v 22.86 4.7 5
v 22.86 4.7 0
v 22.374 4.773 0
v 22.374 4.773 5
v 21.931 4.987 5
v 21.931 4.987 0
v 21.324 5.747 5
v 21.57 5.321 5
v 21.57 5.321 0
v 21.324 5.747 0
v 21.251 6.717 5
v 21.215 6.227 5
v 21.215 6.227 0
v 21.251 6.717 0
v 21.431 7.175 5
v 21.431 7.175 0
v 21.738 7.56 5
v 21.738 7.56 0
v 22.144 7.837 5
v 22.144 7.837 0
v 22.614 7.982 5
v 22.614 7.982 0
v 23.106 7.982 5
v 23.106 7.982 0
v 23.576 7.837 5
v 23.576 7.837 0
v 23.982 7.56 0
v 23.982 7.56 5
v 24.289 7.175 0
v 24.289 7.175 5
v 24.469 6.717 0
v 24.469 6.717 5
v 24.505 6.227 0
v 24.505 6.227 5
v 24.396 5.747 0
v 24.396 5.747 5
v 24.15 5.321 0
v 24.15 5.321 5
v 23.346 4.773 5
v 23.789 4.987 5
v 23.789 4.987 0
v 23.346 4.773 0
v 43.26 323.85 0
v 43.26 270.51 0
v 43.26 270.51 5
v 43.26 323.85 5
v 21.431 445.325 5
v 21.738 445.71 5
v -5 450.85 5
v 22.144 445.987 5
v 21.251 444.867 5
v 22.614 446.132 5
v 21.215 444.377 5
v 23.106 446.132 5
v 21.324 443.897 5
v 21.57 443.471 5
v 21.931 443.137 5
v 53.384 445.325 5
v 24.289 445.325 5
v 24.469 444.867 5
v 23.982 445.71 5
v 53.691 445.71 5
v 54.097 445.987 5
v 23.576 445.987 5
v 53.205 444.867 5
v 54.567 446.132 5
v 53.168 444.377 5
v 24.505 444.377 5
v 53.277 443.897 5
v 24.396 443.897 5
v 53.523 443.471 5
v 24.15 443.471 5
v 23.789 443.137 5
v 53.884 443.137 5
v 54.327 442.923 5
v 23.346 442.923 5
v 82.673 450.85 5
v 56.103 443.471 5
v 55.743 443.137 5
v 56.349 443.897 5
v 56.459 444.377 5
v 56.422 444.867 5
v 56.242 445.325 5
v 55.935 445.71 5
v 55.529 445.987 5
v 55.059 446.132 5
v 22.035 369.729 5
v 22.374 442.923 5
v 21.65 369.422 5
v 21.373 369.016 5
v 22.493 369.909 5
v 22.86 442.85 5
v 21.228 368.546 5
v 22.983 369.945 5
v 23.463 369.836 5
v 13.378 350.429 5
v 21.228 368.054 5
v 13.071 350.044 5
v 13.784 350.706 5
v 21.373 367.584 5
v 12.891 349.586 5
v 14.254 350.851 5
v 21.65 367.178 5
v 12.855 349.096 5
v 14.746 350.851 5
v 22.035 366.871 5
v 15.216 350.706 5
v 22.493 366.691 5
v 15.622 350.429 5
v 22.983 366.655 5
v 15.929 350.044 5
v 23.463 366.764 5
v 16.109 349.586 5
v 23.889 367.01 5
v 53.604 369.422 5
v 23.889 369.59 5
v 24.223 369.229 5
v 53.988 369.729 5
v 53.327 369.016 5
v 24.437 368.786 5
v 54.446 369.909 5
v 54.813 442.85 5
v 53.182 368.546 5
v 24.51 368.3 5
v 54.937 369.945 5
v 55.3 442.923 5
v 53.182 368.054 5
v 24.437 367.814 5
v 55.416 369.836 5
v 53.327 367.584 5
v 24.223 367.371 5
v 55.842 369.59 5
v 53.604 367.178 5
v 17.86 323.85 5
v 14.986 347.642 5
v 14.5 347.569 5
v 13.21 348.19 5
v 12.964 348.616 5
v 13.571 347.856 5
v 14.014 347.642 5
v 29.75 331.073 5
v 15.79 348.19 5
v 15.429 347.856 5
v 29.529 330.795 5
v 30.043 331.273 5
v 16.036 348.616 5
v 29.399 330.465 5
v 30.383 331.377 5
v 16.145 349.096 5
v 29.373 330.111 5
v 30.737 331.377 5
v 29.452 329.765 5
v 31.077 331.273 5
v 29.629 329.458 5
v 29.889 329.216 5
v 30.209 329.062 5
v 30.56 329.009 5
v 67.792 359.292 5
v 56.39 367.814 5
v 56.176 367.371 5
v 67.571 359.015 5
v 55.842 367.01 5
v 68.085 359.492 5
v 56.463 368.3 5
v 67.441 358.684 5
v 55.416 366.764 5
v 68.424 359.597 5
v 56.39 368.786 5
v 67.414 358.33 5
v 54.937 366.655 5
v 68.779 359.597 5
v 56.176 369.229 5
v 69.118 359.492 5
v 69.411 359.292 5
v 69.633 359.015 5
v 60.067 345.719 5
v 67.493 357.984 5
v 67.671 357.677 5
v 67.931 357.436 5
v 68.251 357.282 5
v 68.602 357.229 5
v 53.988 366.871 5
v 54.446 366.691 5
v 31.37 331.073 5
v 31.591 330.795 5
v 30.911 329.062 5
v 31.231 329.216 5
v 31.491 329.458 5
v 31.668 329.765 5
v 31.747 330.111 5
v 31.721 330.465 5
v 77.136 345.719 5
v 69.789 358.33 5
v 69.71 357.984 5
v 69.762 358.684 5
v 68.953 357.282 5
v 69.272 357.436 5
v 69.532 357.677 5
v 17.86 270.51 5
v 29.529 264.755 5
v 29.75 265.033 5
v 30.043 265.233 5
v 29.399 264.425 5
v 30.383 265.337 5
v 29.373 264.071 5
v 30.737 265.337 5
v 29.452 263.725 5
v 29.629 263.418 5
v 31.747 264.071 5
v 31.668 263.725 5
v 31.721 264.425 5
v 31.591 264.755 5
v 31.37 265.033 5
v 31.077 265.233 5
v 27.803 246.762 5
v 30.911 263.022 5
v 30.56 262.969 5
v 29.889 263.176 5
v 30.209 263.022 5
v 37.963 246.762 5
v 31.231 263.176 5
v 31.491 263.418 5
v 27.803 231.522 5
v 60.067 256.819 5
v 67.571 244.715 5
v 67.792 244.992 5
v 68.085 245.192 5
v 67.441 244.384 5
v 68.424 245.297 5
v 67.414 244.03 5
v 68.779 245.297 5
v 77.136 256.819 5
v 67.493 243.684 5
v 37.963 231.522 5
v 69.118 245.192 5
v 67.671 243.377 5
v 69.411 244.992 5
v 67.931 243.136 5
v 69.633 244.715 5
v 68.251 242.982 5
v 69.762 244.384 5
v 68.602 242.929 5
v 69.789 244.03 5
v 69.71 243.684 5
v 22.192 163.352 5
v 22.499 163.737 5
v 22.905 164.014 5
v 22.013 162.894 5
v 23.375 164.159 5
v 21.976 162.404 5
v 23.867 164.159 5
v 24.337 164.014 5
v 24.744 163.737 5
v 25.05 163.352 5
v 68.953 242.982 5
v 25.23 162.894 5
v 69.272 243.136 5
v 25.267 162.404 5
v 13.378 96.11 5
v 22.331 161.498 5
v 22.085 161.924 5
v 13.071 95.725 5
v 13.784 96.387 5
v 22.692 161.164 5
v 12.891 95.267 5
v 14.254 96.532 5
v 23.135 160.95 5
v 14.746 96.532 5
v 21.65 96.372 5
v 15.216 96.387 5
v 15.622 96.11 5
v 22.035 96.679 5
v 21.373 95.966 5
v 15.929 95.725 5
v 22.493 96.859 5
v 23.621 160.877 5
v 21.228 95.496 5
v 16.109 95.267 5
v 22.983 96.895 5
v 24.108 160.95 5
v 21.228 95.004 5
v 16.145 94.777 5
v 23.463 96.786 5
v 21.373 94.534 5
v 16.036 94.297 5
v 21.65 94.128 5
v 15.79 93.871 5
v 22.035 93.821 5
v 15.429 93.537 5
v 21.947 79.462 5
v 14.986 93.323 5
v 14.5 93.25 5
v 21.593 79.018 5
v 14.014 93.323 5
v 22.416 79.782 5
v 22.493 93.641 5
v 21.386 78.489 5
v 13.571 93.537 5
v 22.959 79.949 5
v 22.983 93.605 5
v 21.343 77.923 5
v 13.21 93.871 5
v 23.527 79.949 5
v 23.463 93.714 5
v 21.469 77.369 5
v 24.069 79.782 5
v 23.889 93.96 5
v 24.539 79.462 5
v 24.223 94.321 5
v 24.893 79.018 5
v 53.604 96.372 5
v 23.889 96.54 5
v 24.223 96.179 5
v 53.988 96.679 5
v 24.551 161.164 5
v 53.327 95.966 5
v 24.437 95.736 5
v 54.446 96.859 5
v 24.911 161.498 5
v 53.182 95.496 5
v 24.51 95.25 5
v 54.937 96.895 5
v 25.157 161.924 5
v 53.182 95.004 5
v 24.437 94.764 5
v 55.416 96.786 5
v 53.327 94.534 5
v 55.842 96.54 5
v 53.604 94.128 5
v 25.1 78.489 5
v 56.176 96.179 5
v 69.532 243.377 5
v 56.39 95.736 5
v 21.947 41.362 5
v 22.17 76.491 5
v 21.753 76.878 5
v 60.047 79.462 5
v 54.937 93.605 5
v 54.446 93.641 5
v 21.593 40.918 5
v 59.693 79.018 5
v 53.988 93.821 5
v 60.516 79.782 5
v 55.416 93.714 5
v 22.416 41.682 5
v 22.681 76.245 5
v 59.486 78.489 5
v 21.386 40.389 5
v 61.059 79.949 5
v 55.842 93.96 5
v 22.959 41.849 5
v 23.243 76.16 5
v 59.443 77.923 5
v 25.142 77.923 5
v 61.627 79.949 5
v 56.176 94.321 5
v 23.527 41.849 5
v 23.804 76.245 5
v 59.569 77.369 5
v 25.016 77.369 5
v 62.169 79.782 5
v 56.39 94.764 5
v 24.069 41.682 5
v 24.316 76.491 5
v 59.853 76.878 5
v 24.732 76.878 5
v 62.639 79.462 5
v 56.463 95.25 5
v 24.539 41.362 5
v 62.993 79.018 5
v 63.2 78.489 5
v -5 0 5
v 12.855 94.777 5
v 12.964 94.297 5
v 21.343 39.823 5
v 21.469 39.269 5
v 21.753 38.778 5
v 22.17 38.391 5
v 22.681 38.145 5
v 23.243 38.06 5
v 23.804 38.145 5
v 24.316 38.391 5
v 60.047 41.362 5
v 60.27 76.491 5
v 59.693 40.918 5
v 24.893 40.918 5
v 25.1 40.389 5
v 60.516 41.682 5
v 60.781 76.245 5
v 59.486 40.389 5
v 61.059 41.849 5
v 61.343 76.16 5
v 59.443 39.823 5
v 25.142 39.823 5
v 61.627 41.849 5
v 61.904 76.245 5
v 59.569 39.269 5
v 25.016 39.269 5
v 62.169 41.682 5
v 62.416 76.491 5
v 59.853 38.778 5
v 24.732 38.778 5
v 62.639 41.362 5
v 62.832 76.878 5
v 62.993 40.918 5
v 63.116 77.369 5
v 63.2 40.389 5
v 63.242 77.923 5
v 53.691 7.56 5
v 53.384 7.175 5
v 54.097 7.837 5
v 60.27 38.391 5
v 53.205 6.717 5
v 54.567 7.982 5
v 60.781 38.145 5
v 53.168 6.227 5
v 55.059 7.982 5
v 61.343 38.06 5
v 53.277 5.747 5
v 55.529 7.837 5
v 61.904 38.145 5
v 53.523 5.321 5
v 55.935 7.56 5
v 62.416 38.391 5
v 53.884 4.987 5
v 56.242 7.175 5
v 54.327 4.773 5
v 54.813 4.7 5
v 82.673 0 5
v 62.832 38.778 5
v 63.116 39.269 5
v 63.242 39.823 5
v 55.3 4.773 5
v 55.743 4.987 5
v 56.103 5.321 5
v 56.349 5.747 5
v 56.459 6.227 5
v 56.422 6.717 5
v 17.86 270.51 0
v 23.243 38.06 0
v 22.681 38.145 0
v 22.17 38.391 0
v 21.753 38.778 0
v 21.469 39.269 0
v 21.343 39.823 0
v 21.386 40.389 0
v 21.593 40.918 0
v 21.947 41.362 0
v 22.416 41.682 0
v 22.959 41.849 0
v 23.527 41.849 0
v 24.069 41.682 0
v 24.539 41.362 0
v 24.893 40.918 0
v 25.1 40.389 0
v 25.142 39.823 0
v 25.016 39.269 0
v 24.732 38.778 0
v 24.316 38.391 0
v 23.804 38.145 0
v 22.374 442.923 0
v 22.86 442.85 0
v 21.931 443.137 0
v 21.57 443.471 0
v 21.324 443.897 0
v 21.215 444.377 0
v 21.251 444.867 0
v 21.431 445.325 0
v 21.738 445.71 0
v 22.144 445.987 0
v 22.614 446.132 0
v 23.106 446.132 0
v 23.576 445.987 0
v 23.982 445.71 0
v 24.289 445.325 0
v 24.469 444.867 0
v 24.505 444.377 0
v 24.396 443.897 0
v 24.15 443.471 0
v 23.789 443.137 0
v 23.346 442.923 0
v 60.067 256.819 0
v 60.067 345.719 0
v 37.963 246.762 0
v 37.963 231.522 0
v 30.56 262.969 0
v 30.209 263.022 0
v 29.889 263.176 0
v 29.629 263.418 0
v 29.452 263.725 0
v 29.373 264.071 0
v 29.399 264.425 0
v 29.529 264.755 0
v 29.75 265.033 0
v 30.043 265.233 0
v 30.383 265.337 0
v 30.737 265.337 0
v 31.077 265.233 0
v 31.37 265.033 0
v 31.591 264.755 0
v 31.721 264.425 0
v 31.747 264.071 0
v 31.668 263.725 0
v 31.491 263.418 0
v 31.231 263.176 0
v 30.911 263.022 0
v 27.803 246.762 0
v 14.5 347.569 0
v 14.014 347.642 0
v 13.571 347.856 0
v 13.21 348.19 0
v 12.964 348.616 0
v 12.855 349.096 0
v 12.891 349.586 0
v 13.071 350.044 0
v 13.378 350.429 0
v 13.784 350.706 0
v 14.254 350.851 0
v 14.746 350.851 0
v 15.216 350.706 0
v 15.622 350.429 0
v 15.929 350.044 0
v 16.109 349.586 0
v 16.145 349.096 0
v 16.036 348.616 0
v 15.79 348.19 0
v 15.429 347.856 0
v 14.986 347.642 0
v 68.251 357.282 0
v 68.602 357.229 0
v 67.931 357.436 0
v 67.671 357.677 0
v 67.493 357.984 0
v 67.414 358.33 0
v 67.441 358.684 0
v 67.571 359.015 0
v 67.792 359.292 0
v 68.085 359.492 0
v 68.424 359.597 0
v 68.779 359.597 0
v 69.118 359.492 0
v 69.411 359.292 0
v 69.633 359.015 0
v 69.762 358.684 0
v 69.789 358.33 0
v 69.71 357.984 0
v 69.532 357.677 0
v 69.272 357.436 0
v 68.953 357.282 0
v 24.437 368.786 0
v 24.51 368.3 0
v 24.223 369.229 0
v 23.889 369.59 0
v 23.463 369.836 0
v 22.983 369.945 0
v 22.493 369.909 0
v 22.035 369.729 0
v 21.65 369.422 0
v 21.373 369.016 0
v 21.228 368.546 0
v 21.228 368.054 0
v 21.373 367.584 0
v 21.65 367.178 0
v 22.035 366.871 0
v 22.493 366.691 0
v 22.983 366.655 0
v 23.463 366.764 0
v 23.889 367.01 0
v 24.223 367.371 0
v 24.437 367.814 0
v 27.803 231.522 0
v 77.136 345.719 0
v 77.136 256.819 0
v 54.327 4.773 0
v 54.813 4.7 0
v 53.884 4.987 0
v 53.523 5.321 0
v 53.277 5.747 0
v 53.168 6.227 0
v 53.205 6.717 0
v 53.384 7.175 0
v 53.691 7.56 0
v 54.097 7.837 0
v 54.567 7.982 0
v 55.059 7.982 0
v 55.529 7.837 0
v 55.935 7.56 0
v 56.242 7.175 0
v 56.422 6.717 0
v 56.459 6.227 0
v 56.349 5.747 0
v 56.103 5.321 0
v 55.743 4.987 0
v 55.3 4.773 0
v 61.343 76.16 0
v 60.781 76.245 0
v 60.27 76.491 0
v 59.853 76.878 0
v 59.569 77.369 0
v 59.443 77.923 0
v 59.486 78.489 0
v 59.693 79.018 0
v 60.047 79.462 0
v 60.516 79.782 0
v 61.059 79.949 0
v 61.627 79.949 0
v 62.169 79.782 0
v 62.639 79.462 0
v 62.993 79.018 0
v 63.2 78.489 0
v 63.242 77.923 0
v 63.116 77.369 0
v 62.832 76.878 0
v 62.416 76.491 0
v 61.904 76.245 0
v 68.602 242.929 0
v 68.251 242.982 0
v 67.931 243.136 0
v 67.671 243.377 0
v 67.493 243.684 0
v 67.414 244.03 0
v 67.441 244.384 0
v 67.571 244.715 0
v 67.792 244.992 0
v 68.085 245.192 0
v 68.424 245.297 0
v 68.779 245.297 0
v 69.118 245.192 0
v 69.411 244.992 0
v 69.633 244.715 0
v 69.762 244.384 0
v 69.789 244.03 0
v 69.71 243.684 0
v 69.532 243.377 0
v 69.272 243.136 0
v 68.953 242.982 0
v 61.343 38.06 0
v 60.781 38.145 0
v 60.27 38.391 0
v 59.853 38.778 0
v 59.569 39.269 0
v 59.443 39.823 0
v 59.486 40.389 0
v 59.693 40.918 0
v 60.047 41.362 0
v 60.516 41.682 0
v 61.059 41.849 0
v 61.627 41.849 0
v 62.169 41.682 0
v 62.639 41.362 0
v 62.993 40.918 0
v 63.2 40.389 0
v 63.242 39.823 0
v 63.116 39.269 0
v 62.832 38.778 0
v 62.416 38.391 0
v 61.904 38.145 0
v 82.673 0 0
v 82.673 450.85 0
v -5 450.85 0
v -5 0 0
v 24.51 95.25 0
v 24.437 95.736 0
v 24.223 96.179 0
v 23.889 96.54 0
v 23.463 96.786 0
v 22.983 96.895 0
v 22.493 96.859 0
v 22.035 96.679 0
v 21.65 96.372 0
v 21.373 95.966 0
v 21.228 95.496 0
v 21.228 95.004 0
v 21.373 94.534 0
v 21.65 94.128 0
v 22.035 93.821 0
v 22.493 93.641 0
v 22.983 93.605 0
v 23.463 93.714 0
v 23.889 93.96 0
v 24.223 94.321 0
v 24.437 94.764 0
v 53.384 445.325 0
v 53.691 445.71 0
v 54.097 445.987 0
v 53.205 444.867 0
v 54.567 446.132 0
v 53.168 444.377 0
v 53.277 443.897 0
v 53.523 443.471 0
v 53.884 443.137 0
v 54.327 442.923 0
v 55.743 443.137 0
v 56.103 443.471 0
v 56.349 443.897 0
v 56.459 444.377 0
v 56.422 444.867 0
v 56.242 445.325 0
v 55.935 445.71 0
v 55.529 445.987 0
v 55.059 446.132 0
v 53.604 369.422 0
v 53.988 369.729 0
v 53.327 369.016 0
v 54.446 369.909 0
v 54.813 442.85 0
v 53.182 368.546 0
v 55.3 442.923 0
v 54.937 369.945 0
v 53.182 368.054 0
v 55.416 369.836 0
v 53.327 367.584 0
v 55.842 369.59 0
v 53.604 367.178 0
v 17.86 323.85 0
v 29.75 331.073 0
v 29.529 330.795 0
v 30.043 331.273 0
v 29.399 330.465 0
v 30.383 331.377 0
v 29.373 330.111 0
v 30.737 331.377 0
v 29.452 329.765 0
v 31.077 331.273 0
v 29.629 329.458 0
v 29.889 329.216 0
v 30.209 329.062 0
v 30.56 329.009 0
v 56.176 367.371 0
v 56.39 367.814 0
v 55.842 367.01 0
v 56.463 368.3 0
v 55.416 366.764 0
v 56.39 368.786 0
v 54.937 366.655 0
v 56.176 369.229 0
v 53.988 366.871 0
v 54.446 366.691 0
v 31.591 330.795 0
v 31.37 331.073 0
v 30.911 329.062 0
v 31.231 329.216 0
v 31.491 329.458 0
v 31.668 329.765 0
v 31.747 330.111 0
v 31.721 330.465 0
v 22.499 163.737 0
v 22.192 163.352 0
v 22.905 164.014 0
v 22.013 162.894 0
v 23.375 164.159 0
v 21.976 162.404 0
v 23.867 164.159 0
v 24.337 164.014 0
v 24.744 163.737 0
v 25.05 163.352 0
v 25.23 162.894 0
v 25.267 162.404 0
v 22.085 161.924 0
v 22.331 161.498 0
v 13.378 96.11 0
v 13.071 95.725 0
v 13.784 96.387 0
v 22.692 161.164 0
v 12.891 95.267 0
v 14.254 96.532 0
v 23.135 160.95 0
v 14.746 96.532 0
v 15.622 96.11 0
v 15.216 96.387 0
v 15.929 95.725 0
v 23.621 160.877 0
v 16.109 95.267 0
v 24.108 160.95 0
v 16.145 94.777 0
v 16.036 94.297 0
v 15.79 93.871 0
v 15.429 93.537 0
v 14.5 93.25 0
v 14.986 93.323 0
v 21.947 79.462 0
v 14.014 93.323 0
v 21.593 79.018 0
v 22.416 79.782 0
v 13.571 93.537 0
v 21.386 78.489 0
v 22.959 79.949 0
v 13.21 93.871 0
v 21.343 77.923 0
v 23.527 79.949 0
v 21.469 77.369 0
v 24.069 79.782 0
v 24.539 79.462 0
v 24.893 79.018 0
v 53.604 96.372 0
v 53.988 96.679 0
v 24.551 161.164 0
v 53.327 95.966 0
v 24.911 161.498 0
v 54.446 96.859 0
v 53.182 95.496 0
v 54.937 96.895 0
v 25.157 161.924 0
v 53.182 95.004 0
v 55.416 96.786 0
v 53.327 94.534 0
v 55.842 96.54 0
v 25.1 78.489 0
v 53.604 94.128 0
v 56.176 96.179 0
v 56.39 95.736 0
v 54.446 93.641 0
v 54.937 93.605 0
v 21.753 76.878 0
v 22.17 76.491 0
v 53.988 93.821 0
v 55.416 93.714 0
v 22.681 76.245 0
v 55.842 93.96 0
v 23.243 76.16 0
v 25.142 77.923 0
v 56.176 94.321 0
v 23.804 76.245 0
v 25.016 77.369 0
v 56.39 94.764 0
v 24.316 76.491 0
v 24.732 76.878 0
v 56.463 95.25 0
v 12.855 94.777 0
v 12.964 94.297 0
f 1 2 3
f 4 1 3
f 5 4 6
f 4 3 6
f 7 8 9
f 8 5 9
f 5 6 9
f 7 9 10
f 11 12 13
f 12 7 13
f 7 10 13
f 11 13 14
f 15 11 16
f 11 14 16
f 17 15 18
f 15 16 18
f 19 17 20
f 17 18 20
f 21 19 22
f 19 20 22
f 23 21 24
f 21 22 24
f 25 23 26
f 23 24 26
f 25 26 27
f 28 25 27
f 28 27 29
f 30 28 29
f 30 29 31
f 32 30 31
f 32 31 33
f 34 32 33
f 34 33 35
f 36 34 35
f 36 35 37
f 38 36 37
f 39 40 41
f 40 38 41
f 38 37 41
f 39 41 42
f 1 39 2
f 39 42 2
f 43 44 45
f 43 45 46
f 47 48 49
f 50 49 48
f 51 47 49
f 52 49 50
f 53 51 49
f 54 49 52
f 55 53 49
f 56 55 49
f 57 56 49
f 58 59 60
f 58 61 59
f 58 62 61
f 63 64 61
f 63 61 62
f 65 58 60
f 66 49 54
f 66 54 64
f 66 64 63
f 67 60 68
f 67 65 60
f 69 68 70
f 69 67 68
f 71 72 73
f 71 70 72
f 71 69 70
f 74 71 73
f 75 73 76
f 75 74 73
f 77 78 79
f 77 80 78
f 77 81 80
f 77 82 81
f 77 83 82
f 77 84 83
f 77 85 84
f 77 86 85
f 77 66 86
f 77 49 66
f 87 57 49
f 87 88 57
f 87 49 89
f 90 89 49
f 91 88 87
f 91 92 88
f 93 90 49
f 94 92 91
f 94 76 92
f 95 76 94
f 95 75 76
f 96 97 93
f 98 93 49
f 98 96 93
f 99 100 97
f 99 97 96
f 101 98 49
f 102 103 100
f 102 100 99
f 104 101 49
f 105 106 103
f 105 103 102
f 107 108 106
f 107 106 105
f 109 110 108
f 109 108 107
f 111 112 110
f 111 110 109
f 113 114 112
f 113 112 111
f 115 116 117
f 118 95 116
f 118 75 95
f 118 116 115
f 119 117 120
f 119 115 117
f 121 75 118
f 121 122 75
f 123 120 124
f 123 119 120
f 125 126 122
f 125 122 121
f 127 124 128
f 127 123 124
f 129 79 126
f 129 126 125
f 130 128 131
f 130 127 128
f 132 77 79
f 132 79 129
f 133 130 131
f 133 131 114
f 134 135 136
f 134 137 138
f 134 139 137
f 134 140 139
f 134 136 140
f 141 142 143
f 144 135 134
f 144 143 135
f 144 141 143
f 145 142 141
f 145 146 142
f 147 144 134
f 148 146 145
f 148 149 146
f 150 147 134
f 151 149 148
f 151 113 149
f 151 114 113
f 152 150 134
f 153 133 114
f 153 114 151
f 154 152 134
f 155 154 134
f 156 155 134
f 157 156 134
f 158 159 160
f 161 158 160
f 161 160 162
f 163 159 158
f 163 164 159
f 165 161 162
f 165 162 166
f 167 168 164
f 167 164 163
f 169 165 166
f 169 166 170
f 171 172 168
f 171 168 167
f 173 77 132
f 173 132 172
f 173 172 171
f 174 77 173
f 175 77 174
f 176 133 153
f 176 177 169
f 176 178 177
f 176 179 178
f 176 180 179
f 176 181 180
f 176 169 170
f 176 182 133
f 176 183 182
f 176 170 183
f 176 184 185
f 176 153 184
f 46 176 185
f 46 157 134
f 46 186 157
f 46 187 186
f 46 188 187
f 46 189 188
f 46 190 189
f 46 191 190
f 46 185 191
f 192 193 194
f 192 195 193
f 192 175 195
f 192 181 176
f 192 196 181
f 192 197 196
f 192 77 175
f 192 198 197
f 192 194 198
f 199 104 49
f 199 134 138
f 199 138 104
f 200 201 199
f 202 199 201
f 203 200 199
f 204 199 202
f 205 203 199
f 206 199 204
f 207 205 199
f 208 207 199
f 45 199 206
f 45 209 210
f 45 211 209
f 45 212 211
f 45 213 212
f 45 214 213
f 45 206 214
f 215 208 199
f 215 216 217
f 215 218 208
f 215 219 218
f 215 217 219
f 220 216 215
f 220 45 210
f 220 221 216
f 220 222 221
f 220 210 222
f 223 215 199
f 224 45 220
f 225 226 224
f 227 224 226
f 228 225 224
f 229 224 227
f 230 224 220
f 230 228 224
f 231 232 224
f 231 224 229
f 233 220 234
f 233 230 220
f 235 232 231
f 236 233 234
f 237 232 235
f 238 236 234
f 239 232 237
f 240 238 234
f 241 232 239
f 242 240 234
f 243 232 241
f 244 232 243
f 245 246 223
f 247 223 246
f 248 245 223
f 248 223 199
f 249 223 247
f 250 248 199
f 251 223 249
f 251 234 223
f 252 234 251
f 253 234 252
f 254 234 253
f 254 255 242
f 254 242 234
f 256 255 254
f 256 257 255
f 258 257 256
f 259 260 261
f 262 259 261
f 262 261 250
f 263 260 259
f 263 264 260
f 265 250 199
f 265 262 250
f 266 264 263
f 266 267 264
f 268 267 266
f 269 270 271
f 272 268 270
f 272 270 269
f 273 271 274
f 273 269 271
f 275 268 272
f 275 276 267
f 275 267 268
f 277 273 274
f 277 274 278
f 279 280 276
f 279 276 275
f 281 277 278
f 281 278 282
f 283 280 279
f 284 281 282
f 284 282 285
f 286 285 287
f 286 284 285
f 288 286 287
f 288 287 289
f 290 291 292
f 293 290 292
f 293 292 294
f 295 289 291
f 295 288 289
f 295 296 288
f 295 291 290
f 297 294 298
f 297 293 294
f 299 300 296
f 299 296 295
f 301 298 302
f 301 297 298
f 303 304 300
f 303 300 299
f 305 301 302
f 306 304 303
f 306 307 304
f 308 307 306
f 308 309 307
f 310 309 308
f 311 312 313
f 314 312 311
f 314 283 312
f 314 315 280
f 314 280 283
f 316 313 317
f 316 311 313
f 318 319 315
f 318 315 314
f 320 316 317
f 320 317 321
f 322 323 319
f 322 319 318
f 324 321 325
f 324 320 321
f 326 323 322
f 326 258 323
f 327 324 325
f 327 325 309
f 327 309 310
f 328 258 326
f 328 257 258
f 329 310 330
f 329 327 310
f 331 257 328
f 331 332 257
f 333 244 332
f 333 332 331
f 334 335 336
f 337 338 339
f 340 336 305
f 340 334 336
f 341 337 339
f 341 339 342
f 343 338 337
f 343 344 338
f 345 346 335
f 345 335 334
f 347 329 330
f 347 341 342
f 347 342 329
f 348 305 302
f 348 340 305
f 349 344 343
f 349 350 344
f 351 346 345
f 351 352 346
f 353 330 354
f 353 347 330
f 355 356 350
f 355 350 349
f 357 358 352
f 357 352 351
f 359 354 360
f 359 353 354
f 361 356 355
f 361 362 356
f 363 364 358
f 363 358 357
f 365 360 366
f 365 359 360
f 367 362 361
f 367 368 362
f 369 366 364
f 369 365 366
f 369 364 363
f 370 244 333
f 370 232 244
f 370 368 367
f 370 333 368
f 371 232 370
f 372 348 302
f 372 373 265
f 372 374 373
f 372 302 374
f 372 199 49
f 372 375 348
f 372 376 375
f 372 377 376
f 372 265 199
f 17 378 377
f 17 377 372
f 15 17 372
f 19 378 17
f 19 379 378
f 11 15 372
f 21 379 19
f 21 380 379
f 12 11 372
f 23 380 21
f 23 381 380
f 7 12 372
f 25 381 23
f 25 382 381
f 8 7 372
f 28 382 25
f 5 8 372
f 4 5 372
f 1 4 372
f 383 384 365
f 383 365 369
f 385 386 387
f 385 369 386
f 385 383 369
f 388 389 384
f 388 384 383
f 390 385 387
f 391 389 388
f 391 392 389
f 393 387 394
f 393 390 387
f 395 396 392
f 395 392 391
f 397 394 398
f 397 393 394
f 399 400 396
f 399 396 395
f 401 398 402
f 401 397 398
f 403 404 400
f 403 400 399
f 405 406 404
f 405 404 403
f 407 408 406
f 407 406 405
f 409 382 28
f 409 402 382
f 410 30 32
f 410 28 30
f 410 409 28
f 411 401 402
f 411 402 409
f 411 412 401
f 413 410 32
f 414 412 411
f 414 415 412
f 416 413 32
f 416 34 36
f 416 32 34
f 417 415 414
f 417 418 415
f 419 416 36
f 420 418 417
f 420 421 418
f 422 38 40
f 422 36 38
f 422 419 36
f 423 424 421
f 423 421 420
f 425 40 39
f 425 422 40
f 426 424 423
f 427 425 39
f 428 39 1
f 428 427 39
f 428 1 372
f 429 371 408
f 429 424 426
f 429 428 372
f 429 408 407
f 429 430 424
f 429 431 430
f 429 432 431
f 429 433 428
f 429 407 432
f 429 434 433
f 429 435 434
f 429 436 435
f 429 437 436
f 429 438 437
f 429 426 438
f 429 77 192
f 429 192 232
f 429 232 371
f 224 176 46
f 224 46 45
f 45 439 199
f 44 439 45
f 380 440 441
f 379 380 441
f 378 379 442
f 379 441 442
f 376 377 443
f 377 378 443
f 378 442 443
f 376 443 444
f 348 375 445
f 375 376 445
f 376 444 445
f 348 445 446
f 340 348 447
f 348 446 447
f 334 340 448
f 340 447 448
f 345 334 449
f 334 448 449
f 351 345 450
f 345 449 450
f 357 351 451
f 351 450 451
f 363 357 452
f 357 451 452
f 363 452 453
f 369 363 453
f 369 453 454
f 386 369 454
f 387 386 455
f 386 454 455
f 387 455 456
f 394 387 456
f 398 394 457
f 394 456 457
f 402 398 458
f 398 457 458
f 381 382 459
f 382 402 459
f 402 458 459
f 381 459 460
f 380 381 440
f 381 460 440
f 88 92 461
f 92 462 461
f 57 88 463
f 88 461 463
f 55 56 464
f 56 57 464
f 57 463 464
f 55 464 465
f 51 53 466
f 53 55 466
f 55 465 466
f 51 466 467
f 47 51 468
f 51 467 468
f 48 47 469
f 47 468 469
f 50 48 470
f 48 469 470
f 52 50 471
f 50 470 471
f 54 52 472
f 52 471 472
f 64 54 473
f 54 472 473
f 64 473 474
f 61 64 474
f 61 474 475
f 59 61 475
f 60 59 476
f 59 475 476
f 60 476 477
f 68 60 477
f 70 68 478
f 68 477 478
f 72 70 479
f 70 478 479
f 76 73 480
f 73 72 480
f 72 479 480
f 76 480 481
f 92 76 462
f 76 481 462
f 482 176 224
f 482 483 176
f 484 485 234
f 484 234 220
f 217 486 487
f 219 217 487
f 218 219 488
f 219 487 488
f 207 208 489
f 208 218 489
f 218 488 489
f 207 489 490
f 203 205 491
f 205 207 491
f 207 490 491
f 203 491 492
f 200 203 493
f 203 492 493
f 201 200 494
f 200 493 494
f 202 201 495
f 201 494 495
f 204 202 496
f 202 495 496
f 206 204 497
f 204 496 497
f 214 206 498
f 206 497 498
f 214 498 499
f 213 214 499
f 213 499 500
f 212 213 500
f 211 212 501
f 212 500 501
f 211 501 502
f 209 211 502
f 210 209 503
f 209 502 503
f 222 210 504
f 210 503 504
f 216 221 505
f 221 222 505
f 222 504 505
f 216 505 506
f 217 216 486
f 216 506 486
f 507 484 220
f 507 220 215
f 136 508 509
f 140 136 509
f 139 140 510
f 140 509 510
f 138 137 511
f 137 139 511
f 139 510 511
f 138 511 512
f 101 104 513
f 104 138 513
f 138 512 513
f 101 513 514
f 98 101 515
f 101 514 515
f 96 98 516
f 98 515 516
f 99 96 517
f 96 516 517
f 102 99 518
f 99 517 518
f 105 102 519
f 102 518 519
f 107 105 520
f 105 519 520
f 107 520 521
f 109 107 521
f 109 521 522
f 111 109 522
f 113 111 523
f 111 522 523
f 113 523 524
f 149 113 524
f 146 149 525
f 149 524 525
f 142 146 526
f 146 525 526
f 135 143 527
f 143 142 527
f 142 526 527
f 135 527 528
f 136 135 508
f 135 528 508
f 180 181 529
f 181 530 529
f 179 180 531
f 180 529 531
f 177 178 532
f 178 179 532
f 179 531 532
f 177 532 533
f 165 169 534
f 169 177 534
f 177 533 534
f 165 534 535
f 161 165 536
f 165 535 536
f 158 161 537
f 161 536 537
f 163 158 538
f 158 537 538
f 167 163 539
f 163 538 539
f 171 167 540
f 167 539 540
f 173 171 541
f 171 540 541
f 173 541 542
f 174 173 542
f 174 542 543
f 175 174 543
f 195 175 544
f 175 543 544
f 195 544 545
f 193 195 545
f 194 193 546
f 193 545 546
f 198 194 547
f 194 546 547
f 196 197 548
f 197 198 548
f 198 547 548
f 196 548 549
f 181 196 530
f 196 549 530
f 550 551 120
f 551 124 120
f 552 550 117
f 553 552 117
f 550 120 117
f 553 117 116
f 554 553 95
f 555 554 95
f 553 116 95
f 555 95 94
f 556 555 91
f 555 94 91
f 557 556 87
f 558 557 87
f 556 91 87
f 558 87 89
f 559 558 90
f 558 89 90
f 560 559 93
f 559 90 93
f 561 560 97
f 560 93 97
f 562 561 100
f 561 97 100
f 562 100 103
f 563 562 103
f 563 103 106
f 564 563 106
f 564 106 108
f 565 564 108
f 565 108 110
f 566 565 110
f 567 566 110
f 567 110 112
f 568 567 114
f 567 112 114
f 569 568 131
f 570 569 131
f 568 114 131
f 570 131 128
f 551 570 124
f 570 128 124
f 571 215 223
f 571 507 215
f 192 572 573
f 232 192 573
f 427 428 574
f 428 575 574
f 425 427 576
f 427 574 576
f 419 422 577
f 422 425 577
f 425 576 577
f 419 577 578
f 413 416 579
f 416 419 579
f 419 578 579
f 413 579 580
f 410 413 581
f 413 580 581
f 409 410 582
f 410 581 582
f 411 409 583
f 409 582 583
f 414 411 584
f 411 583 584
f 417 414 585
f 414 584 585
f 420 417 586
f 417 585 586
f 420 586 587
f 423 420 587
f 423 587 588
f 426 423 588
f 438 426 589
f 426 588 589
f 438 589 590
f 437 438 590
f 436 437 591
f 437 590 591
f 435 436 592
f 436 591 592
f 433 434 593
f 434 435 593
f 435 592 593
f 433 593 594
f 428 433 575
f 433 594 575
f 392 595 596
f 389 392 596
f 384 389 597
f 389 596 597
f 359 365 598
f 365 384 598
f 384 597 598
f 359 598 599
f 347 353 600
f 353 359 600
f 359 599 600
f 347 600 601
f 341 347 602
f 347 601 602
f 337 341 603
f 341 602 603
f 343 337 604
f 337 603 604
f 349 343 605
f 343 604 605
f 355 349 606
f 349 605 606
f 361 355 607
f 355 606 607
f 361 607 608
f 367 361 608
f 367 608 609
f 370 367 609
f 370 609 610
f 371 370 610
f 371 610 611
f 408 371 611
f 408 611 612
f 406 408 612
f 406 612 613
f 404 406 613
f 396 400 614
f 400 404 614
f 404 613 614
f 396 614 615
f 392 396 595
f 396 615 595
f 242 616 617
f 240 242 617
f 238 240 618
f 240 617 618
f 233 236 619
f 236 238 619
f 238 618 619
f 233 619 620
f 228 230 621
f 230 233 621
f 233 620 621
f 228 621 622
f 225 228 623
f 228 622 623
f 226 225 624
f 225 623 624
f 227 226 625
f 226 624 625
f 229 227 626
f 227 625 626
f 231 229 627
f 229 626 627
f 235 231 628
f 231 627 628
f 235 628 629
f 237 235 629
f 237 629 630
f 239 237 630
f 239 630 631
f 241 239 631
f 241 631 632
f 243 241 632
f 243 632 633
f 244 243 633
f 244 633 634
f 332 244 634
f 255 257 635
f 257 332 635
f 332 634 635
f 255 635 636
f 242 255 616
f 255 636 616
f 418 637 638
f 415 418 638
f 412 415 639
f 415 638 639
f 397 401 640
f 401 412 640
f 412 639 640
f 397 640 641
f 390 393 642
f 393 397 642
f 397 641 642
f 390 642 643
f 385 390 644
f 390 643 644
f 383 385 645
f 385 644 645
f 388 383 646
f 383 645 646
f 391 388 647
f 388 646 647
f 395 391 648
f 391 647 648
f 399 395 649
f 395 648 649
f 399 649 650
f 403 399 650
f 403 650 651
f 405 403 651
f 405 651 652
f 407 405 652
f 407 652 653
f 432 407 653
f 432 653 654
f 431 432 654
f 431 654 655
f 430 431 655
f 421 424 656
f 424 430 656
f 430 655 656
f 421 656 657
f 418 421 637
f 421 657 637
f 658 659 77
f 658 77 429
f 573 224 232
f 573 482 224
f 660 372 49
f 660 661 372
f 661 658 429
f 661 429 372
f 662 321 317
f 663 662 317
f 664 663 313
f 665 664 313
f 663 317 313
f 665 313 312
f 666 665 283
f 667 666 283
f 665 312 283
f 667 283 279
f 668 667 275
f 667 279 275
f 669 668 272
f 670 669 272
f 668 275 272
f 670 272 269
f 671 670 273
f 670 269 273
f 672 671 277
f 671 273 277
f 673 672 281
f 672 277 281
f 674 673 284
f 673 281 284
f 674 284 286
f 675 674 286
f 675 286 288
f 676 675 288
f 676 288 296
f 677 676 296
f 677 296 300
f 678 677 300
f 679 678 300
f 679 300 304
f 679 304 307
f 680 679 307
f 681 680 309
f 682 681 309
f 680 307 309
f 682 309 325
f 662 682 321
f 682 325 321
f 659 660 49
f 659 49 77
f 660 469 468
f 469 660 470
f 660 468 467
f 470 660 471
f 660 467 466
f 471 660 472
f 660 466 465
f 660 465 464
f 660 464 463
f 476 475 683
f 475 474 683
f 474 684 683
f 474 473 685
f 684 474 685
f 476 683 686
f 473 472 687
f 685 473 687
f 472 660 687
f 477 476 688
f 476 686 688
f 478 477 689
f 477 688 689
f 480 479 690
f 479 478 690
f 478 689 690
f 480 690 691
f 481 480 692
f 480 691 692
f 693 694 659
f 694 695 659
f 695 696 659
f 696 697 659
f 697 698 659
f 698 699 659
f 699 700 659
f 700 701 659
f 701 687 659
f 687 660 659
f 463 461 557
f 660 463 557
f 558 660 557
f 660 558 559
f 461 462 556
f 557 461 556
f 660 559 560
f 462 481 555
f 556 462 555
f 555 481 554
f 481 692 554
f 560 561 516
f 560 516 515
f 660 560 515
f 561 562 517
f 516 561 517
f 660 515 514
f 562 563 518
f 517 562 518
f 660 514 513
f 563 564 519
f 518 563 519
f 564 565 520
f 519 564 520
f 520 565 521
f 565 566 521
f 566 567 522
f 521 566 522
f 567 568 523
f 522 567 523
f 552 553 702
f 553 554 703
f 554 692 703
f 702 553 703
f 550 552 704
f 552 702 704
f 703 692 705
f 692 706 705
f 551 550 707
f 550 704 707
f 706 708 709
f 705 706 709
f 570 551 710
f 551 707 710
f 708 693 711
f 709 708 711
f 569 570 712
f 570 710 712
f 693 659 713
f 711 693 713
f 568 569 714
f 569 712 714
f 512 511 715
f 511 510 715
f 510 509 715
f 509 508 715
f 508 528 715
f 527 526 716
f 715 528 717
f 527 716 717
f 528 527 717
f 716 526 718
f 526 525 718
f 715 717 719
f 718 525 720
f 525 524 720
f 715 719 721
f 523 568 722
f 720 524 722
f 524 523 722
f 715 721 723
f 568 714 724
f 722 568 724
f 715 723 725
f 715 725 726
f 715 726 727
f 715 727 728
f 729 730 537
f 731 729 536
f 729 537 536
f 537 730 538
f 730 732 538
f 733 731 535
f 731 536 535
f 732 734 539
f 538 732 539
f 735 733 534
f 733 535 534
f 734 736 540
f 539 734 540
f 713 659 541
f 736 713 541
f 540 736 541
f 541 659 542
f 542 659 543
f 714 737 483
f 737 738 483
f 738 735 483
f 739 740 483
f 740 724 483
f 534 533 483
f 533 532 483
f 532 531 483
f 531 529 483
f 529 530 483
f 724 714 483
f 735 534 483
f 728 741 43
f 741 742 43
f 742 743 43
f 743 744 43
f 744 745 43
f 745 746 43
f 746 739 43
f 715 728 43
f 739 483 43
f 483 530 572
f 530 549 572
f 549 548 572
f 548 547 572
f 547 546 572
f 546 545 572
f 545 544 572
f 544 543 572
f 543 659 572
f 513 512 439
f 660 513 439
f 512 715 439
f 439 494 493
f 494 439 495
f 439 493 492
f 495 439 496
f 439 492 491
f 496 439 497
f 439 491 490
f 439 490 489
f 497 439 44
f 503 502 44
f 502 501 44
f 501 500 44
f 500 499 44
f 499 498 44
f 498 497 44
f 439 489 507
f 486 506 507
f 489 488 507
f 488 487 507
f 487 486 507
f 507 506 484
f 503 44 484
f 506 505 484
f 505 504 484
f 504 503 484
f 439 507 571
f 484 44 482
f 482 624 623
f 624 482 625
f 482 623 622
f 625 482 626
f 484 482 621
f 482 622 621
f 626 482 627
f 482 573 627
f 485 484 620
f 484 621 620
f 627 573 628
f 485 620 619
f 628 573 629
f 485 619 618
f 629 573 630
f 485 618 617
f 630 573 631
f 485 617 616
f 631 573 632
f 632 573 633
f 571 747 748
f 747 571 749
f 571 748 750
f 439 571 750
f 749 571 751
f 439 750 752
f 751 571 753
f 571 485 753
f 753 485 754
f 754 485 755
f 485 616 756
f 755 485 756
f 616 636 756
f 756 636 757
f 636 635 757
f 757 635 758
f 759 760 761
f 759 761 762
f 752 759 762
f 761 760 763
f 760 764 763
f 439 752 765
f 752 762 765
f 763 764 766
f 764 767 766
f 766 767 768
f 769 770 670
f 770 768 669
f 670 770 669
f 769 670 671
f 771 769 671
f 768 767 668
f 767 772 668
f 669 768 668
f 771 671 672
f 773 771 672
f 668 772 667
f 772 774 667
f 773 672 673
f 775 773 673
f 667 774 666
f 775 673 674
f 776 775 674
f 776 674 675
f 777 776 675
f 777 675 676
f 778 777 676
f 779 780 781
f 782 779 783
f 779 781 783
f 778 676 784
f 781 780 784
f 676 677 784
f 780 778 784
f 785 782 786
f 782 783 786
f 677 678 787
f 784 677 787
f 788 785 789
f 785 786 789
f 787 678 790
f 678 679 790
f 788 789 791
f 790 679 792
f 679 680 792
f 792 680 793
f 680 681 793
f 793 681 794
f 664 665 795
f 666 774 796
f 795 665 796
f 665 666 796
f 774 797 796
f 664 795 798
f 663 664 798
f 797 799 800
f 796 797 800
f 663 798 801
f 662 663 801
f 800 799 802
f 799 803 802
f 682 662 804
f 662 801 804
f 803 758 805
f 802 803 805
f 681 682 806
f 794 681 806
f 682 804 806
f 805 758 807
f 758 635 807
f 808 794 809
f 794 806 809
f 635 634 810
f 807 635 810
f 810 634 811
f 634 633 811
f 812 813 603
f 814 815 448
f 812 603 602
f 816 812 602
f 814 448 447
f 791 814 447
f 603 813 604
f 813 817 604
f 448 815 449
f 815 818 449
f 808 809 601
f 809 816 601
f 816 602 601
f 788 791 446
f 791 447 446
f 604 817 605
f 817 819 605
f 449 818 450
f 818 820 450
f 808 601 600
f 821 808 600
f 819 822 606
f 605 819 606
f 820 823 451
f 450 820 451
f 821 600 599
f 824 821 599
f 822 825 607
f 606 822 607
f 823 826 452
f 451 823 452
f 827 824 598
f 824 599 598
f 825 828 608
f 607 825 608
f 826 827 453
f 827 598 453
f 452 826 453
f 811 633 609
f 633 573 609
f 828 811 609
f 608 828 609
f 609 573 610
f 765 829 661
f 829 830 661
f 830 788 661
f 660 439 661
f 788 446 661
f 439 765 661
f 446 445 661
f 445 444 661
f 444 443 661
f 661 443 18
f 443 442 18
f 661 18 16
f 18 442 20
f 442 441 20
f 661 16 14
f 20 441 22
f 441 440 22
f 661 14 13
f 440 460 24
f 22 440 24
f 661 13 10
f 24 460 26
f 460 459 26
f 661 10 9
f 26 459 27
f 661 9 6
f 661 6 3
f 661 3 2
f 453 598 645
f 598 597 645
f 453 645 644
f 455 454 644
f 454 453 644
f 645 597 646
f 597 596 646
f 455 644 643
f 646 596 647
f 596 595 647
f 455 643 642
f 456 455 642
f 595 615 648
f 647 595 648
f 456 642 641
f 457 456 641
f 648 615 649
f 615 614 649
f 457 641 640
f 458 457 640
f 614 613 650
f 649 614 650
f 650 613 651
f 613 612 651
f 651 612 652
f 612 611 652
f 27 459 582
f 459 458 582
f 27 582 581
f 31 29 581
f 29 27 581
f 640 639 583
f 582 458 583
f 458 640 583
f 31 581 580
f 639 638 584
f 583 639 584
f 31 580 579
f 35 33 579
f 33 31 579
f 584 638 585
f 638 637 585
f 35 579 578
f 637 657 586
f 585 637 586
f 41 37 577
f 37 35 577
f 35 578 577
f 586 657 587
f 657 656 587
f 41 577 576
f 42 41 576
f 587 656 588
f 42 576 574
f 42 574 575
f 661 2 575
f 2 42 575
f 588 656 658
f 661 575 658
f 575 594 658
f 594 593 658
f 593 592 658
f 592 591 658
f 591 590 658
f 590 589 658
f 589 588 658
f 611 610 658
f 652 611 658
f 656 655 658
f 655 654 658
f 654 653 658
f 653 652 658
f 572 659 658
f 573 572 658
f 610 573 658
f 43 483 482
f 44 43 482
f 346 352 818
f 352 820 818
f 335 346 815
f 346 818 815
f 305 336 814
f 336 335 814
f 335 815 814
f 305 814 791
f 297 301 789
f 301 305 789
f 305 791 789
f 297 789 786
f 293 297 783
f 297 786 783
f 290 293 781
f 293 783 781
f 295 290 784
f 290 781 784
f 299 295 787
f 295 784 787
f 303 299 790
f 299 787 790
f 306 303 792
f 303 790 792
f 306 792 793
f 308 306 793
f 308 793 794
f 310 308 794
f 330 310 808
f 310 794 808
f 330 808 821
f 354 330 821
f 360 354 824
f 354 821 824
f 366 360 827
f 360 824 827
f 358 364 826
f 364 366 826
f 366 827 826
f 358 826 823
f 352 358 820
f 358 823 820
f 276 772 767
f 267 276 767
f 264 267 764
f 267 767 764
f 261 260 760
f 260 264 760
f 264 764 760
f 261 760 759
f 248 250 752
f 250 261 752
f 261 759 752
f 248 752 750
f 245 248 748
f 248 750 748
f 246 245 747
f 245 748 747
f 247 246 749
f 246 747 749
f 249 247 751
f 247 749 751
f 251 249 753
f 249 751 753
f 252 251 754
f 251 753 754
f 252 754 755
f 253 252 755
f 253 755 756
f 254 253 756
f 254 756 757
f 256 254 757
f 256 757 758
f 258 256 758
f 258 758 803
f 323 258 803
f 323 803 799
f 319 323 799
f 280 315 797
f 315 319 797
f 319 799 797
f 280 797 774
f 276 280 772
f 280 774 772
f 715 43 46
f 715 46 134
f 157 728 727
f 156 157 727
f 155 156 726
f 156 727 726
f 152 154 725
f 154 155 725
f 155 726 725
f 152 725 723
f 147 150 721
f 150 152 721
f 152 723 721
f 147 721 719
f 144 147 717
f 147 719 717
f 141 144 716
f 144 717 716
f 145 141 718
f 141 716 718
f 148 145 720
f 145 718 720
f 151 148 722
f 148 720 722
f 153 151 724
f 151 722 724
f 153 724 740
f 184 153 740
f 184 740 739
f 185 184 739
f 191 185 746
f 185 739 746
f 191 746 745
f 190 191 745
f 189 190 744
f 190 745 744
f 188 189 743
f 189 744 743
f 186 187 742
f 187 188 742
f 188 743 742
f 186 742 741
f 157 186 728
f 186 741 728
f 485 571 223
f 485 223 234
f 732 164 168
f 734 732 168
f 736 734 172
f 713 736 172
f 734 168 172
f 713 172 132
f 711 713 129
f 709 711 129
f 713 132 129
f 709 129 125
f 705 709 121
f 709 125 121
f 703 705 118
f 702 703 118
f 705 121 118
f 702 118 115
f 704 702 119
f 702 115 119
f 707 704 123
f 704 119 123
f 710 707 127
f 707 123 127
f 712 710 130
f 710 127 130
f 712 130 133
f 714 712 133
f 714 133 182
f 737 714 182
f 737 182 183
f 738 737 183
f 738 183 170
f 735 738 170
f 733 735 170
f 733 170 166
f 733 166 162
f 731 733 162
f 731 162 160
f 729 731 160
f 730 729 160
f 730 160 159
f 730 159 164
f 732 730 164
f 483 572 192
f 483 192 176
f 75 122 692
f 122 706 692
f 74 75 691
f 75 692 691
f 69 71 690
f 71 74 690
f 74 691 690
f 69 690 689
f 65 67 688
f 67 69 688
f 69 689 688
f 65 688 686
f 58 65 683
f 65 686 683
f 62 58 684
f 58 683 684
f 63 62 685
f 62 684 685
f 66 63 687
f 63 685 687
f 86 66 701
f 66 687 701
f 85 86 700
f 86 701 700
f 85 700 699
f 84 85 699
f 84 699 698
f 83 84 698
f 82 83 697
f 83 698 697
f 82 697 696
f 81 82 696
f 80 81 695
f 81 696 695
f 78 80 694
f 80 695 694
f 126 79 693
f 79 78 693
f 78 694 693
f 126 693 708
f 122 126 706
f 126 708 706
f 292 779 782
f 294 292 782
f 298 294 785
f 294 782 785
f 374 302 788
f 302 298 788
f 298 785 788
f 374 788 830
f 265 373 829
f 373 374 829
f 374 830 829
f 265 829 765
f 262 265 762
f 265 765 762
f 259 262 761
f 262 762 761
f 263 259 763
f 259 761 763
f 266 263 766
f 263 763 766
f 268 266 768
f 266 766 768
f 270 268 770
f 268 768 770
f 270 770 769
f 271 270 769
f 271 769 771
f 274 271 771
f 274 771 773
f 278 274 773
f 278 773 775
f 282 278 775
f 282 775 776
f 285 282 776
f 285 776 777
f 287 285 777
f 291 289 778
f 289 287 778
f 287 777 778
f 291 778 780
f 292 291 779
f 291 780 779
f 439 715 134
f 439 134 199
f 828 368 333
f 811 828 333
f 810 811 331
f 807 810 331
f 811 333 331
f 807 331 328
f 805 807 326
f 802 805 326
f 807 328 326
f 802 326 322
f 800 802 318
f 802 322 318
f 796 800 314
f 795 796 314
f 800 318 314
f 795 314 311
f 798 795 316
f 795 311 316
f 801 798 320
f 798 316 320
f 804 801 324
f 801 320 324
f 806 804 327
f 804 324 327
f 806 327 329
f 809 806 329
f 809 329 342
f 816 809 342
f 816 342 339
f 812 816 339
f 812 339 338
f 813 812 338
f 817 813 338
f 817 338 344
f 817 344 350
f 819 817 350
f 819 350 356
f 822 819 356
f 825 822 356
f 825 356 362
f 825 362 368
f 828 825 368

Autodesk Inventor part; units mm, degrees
ref_plane "YZ Plane" through (0, 0, 0) normal (1, 0, 0) x (0, 1, 0)
ref_plane "XZ Plane" through (0, 0, 0) normal (0, 1, 0) x (-1, 0, 0)
ref_plane "XY Plane" through (0, 0, 0) normal (0, 0, 1) x (1, 0, 0)
ref_plane "Work Plane1" through (0, 0, 0) normal (0, 0, 1) x (0, -1, 0)
sketch "Sketch1" plane through (0, 0, 0) normal (0, 0, 1) x (0, -1, 0)
  line L0 (-450.85, 82.6732) -> (0, 82.6732) construction
  line L1 (0, -5) -> (-450.85, -5) construction
  line L2 (-450.85, -5) -> (-450.85, 82.6732)
  line L3 (0, 82.6732) -> (0, -5)
  line L4 (0, -5) -> (-450.85, -5)
  circle A0 centre (-444.5, 22.86) radius 1.7 construction
  circle A1 centre (-444.5, 54.8132) radius 1.7 construction
  circle A2 centre (-252.8255, 65.525) radius 1.9304 construction
  circle A3 centre (-210.0251, 141.725) radius 1.9304 construction
  circle A4 centre (-6.35, 54.8132) radius 1.7 construction
  circle A5 centre (-6.35, 22.86) radius 1.7 construction
  circle A6 centre (-94.9, 14.5) radius 1.7 construction
  circle A7 centre (-349.219, 14.5) radius 1.7 construction
  circle A8 centre (-444.5, 22.86) radius 1.65
  circle A9 centre (-444.5, 54.8132) radius 1.65
  circle A10 centre (-349.219, 14.5) radius 1.65
  circle A11 centre (-210.0251, 141.725) radius 1.65
  circle A12 centre (-94.9, 14.5) radius 1.65
  circle A13 centre (-6.35, 54.8132) radius 1.65
  circle A14 centre (-6.35, 22.86) radius 1.65
  circle A15 centre (-78.0653, 61.3428) radius 1.905
  line L5 (-78.0653, 61.3428) -> (-78.0653, 23.2428) construction
  line L6 (-78.0653, 23.2428) -> (-39.9653, 23.2428) construction
  line L7 (-39.9653, 23.2428) -> (-39.9653, 61.3428) construction
  circle A16 centre (-78.0653, 23.2428) radius 1.905
  circle A17 centre (-39.9653, 23.2428) radius 1.905
  circle A18 centre (-39.9653, 61.3428) radius 1.905
  line L8 (-450.85, 15.32) -> (-438.15, 15.32) construction
  line L9 (-246.7618, 27.8034) -> (-231.5218, 27.8034)
  line L10 (-231.5218, 27.8034) -> (-231.5218, 37.9634)
  line L11 (-231.5218, 37.9634) -> (-246.7618, 37.9634)
  line L12 (-246.7618, 37.9634) -> (-246.7618, 27.8034)
  line L13 (-345.7194, 77.136) -> (-345.7194, 60.0672)
  line L14 (-345.7194, 60.0672) -> (-256.8194, 60.0672)
  line L15 (-256.8194, 60.0672) -> (-256.8194, 77.136)
  line L16 (-450.85, 82.6732) -> (-345.7194, 82.6732)
  line L17 (-450.85, 82.6732) -> (0, 82.6732)
  circle A19 centre (-162.5271, 23.6214) radius 1.65
  circle A20 centre (-244.1194, 68.6016) radius 1.1906
  line L18 (-345.7194, 77.136) -> (-256.8194, 77.136)
  circle A21 centre (-358.4194, 68.6016) radius 1.1906
  line L19 (-301.2694, 60.0672) -> (-301.2694, 77.136) construction
  line L20 (-323.85, 17.86) -> (-270.51, 17.86)
  line L21 (-270.51, 17.86) -> (-270.51, 43.26)
  line L22 (-270.51, 43.26) -> (-323.85, 43.26)
  line L23 (-323.85, 43.26) -> (-323.85, 17.86)
  circle A22 centre (-264.16, 30.56) radius 1.1906
  circle A23 centre (-330.2, 30.56) radius 1.1906
  point P0 (0, 0)
  dimension "M3Clearance" = 3.3
  dimension "d1" = 3.3
  dimension "d2" = 3.3
  dimension "d4" = 3.3
  dimension "d5" = 3.3
  dimension "d6" = 3.3
  dimension "d7" = 3.3
  dimension "Number6Clearance" = 3.81
  dimension "d9" = 38.1
  dimension "d10" = 38.1
  dimension "d11" = 38.1
  dimension "d12" = 3.81
  dimension "d13" = 3.81
  dimension "d14" = 3.81
  dimension "d21" = 12.7
  dimension "d22" = 20.32
  dimension "d24" = 15.24
  dimension "d25" = 10.16
  dimension "d26" = 22.606
  dimension "d36" = 3.3
  dimension "d37" = 47.498
  dimension "d38" = 59.0518
  dimension "d39" = 59.0518
  dimension "Number6WoodScrewPilot" = 2.3813
  dimension "d41" = 8.5344
  dimension "d42" = 12.7
  dimension "d43" = 5.5372
  dimension "d44" = 17.0688
  dimension "d45" = 2.3813
  dimension "d46" = 8.5344
  dimension "d47" = 12.7
  dimension "d48" = 149.5806
  dimension "d49" = 44.45
  dimension "d50" = 127
  dimension "d51" = 53.34
  dimension "d52" = 22.86
  dimension "d53" = 25.4
  dimension "d54" = 2.3813
  dimension "d55" = 12.7
  dimension "d56" = 6.35
  dimension "d57" = 2.3813
  dimension "d58" = 6.35
  dimension "d59" = 12.7
extrude "Extrusion1" add sketch "Sketch1" along normal blind 5 contours L2 L16 L17 L3 L4
sketch "Sketch4" plane through (0, 0, 5) normal (0, 0, 1) x (1, 0, 0)
  circle A0 centre (54.8132, 95.25) radius 1.7 construction
  circle A1 centre (22.86, 95.25) radius 1.7 construction
  circle A2 centre (54.8132, 368.3) radius 1.7 construction
  circle A3 centre (22.86, 368.3) radius 1.7 construction
  circle A4 centre (22.86, 95.25) radius 1.65
  circle A5 centre (54.8132, 95.25) radius 1.65
  circle A6 centre (22.86, 368.3) radius 1.65
  circle A7 centre (54.8132, 368.3) radius 1.65
  point P0 (0, 0)
  dimension "d60" = 3.3
  dimension "d61" = 3.3
  dimension "d62" = 3.3
  dimension "d63" = 3.3
extrude "Extrusion3" cut sketch "Sketch4" against normal blind 5
equation "\"d1\" = M3Clearance"
equation "\"d2\" = M3Clearance"
equation "\"d4\" = M3Clearance"
equation "\"d5\" = M3Clearance"
equation "\"d6\" = M3Clearance"
equation "\"d7\" = M3Clearance"
equation "\"d12\" = Number6Clearance"
equation "\"d13\" = Number6Clearance"
equation "\"d14\" = Number6Clearance"
equation "\"d21\" = d55"
equation "\"d36\" = M3Clearance"
equation "\"d39\" = d38"
equation "\"d41\" = 0.5 * d44"
equation "\"d45\" = Number6WoodScrewPilot"
equation "\"d46\" = d41"
equation "\"d47\" = d42"
equation "\"d54\" = Number6WoodScrewPilot"
equation "\"d55\" = 0.5 * d53"
equation "\"d57\" = Number6WoodScrewPilot"
equation "\"d58\" = d56"
equation "\"d60\" = M3Clearance"
equation "\"d61\" = M3Clearance"
equation "\"d62\" = M3Clearance"
equation "\"d63\" = M3Clearance"
properties part number "top of drivetrain 2"
